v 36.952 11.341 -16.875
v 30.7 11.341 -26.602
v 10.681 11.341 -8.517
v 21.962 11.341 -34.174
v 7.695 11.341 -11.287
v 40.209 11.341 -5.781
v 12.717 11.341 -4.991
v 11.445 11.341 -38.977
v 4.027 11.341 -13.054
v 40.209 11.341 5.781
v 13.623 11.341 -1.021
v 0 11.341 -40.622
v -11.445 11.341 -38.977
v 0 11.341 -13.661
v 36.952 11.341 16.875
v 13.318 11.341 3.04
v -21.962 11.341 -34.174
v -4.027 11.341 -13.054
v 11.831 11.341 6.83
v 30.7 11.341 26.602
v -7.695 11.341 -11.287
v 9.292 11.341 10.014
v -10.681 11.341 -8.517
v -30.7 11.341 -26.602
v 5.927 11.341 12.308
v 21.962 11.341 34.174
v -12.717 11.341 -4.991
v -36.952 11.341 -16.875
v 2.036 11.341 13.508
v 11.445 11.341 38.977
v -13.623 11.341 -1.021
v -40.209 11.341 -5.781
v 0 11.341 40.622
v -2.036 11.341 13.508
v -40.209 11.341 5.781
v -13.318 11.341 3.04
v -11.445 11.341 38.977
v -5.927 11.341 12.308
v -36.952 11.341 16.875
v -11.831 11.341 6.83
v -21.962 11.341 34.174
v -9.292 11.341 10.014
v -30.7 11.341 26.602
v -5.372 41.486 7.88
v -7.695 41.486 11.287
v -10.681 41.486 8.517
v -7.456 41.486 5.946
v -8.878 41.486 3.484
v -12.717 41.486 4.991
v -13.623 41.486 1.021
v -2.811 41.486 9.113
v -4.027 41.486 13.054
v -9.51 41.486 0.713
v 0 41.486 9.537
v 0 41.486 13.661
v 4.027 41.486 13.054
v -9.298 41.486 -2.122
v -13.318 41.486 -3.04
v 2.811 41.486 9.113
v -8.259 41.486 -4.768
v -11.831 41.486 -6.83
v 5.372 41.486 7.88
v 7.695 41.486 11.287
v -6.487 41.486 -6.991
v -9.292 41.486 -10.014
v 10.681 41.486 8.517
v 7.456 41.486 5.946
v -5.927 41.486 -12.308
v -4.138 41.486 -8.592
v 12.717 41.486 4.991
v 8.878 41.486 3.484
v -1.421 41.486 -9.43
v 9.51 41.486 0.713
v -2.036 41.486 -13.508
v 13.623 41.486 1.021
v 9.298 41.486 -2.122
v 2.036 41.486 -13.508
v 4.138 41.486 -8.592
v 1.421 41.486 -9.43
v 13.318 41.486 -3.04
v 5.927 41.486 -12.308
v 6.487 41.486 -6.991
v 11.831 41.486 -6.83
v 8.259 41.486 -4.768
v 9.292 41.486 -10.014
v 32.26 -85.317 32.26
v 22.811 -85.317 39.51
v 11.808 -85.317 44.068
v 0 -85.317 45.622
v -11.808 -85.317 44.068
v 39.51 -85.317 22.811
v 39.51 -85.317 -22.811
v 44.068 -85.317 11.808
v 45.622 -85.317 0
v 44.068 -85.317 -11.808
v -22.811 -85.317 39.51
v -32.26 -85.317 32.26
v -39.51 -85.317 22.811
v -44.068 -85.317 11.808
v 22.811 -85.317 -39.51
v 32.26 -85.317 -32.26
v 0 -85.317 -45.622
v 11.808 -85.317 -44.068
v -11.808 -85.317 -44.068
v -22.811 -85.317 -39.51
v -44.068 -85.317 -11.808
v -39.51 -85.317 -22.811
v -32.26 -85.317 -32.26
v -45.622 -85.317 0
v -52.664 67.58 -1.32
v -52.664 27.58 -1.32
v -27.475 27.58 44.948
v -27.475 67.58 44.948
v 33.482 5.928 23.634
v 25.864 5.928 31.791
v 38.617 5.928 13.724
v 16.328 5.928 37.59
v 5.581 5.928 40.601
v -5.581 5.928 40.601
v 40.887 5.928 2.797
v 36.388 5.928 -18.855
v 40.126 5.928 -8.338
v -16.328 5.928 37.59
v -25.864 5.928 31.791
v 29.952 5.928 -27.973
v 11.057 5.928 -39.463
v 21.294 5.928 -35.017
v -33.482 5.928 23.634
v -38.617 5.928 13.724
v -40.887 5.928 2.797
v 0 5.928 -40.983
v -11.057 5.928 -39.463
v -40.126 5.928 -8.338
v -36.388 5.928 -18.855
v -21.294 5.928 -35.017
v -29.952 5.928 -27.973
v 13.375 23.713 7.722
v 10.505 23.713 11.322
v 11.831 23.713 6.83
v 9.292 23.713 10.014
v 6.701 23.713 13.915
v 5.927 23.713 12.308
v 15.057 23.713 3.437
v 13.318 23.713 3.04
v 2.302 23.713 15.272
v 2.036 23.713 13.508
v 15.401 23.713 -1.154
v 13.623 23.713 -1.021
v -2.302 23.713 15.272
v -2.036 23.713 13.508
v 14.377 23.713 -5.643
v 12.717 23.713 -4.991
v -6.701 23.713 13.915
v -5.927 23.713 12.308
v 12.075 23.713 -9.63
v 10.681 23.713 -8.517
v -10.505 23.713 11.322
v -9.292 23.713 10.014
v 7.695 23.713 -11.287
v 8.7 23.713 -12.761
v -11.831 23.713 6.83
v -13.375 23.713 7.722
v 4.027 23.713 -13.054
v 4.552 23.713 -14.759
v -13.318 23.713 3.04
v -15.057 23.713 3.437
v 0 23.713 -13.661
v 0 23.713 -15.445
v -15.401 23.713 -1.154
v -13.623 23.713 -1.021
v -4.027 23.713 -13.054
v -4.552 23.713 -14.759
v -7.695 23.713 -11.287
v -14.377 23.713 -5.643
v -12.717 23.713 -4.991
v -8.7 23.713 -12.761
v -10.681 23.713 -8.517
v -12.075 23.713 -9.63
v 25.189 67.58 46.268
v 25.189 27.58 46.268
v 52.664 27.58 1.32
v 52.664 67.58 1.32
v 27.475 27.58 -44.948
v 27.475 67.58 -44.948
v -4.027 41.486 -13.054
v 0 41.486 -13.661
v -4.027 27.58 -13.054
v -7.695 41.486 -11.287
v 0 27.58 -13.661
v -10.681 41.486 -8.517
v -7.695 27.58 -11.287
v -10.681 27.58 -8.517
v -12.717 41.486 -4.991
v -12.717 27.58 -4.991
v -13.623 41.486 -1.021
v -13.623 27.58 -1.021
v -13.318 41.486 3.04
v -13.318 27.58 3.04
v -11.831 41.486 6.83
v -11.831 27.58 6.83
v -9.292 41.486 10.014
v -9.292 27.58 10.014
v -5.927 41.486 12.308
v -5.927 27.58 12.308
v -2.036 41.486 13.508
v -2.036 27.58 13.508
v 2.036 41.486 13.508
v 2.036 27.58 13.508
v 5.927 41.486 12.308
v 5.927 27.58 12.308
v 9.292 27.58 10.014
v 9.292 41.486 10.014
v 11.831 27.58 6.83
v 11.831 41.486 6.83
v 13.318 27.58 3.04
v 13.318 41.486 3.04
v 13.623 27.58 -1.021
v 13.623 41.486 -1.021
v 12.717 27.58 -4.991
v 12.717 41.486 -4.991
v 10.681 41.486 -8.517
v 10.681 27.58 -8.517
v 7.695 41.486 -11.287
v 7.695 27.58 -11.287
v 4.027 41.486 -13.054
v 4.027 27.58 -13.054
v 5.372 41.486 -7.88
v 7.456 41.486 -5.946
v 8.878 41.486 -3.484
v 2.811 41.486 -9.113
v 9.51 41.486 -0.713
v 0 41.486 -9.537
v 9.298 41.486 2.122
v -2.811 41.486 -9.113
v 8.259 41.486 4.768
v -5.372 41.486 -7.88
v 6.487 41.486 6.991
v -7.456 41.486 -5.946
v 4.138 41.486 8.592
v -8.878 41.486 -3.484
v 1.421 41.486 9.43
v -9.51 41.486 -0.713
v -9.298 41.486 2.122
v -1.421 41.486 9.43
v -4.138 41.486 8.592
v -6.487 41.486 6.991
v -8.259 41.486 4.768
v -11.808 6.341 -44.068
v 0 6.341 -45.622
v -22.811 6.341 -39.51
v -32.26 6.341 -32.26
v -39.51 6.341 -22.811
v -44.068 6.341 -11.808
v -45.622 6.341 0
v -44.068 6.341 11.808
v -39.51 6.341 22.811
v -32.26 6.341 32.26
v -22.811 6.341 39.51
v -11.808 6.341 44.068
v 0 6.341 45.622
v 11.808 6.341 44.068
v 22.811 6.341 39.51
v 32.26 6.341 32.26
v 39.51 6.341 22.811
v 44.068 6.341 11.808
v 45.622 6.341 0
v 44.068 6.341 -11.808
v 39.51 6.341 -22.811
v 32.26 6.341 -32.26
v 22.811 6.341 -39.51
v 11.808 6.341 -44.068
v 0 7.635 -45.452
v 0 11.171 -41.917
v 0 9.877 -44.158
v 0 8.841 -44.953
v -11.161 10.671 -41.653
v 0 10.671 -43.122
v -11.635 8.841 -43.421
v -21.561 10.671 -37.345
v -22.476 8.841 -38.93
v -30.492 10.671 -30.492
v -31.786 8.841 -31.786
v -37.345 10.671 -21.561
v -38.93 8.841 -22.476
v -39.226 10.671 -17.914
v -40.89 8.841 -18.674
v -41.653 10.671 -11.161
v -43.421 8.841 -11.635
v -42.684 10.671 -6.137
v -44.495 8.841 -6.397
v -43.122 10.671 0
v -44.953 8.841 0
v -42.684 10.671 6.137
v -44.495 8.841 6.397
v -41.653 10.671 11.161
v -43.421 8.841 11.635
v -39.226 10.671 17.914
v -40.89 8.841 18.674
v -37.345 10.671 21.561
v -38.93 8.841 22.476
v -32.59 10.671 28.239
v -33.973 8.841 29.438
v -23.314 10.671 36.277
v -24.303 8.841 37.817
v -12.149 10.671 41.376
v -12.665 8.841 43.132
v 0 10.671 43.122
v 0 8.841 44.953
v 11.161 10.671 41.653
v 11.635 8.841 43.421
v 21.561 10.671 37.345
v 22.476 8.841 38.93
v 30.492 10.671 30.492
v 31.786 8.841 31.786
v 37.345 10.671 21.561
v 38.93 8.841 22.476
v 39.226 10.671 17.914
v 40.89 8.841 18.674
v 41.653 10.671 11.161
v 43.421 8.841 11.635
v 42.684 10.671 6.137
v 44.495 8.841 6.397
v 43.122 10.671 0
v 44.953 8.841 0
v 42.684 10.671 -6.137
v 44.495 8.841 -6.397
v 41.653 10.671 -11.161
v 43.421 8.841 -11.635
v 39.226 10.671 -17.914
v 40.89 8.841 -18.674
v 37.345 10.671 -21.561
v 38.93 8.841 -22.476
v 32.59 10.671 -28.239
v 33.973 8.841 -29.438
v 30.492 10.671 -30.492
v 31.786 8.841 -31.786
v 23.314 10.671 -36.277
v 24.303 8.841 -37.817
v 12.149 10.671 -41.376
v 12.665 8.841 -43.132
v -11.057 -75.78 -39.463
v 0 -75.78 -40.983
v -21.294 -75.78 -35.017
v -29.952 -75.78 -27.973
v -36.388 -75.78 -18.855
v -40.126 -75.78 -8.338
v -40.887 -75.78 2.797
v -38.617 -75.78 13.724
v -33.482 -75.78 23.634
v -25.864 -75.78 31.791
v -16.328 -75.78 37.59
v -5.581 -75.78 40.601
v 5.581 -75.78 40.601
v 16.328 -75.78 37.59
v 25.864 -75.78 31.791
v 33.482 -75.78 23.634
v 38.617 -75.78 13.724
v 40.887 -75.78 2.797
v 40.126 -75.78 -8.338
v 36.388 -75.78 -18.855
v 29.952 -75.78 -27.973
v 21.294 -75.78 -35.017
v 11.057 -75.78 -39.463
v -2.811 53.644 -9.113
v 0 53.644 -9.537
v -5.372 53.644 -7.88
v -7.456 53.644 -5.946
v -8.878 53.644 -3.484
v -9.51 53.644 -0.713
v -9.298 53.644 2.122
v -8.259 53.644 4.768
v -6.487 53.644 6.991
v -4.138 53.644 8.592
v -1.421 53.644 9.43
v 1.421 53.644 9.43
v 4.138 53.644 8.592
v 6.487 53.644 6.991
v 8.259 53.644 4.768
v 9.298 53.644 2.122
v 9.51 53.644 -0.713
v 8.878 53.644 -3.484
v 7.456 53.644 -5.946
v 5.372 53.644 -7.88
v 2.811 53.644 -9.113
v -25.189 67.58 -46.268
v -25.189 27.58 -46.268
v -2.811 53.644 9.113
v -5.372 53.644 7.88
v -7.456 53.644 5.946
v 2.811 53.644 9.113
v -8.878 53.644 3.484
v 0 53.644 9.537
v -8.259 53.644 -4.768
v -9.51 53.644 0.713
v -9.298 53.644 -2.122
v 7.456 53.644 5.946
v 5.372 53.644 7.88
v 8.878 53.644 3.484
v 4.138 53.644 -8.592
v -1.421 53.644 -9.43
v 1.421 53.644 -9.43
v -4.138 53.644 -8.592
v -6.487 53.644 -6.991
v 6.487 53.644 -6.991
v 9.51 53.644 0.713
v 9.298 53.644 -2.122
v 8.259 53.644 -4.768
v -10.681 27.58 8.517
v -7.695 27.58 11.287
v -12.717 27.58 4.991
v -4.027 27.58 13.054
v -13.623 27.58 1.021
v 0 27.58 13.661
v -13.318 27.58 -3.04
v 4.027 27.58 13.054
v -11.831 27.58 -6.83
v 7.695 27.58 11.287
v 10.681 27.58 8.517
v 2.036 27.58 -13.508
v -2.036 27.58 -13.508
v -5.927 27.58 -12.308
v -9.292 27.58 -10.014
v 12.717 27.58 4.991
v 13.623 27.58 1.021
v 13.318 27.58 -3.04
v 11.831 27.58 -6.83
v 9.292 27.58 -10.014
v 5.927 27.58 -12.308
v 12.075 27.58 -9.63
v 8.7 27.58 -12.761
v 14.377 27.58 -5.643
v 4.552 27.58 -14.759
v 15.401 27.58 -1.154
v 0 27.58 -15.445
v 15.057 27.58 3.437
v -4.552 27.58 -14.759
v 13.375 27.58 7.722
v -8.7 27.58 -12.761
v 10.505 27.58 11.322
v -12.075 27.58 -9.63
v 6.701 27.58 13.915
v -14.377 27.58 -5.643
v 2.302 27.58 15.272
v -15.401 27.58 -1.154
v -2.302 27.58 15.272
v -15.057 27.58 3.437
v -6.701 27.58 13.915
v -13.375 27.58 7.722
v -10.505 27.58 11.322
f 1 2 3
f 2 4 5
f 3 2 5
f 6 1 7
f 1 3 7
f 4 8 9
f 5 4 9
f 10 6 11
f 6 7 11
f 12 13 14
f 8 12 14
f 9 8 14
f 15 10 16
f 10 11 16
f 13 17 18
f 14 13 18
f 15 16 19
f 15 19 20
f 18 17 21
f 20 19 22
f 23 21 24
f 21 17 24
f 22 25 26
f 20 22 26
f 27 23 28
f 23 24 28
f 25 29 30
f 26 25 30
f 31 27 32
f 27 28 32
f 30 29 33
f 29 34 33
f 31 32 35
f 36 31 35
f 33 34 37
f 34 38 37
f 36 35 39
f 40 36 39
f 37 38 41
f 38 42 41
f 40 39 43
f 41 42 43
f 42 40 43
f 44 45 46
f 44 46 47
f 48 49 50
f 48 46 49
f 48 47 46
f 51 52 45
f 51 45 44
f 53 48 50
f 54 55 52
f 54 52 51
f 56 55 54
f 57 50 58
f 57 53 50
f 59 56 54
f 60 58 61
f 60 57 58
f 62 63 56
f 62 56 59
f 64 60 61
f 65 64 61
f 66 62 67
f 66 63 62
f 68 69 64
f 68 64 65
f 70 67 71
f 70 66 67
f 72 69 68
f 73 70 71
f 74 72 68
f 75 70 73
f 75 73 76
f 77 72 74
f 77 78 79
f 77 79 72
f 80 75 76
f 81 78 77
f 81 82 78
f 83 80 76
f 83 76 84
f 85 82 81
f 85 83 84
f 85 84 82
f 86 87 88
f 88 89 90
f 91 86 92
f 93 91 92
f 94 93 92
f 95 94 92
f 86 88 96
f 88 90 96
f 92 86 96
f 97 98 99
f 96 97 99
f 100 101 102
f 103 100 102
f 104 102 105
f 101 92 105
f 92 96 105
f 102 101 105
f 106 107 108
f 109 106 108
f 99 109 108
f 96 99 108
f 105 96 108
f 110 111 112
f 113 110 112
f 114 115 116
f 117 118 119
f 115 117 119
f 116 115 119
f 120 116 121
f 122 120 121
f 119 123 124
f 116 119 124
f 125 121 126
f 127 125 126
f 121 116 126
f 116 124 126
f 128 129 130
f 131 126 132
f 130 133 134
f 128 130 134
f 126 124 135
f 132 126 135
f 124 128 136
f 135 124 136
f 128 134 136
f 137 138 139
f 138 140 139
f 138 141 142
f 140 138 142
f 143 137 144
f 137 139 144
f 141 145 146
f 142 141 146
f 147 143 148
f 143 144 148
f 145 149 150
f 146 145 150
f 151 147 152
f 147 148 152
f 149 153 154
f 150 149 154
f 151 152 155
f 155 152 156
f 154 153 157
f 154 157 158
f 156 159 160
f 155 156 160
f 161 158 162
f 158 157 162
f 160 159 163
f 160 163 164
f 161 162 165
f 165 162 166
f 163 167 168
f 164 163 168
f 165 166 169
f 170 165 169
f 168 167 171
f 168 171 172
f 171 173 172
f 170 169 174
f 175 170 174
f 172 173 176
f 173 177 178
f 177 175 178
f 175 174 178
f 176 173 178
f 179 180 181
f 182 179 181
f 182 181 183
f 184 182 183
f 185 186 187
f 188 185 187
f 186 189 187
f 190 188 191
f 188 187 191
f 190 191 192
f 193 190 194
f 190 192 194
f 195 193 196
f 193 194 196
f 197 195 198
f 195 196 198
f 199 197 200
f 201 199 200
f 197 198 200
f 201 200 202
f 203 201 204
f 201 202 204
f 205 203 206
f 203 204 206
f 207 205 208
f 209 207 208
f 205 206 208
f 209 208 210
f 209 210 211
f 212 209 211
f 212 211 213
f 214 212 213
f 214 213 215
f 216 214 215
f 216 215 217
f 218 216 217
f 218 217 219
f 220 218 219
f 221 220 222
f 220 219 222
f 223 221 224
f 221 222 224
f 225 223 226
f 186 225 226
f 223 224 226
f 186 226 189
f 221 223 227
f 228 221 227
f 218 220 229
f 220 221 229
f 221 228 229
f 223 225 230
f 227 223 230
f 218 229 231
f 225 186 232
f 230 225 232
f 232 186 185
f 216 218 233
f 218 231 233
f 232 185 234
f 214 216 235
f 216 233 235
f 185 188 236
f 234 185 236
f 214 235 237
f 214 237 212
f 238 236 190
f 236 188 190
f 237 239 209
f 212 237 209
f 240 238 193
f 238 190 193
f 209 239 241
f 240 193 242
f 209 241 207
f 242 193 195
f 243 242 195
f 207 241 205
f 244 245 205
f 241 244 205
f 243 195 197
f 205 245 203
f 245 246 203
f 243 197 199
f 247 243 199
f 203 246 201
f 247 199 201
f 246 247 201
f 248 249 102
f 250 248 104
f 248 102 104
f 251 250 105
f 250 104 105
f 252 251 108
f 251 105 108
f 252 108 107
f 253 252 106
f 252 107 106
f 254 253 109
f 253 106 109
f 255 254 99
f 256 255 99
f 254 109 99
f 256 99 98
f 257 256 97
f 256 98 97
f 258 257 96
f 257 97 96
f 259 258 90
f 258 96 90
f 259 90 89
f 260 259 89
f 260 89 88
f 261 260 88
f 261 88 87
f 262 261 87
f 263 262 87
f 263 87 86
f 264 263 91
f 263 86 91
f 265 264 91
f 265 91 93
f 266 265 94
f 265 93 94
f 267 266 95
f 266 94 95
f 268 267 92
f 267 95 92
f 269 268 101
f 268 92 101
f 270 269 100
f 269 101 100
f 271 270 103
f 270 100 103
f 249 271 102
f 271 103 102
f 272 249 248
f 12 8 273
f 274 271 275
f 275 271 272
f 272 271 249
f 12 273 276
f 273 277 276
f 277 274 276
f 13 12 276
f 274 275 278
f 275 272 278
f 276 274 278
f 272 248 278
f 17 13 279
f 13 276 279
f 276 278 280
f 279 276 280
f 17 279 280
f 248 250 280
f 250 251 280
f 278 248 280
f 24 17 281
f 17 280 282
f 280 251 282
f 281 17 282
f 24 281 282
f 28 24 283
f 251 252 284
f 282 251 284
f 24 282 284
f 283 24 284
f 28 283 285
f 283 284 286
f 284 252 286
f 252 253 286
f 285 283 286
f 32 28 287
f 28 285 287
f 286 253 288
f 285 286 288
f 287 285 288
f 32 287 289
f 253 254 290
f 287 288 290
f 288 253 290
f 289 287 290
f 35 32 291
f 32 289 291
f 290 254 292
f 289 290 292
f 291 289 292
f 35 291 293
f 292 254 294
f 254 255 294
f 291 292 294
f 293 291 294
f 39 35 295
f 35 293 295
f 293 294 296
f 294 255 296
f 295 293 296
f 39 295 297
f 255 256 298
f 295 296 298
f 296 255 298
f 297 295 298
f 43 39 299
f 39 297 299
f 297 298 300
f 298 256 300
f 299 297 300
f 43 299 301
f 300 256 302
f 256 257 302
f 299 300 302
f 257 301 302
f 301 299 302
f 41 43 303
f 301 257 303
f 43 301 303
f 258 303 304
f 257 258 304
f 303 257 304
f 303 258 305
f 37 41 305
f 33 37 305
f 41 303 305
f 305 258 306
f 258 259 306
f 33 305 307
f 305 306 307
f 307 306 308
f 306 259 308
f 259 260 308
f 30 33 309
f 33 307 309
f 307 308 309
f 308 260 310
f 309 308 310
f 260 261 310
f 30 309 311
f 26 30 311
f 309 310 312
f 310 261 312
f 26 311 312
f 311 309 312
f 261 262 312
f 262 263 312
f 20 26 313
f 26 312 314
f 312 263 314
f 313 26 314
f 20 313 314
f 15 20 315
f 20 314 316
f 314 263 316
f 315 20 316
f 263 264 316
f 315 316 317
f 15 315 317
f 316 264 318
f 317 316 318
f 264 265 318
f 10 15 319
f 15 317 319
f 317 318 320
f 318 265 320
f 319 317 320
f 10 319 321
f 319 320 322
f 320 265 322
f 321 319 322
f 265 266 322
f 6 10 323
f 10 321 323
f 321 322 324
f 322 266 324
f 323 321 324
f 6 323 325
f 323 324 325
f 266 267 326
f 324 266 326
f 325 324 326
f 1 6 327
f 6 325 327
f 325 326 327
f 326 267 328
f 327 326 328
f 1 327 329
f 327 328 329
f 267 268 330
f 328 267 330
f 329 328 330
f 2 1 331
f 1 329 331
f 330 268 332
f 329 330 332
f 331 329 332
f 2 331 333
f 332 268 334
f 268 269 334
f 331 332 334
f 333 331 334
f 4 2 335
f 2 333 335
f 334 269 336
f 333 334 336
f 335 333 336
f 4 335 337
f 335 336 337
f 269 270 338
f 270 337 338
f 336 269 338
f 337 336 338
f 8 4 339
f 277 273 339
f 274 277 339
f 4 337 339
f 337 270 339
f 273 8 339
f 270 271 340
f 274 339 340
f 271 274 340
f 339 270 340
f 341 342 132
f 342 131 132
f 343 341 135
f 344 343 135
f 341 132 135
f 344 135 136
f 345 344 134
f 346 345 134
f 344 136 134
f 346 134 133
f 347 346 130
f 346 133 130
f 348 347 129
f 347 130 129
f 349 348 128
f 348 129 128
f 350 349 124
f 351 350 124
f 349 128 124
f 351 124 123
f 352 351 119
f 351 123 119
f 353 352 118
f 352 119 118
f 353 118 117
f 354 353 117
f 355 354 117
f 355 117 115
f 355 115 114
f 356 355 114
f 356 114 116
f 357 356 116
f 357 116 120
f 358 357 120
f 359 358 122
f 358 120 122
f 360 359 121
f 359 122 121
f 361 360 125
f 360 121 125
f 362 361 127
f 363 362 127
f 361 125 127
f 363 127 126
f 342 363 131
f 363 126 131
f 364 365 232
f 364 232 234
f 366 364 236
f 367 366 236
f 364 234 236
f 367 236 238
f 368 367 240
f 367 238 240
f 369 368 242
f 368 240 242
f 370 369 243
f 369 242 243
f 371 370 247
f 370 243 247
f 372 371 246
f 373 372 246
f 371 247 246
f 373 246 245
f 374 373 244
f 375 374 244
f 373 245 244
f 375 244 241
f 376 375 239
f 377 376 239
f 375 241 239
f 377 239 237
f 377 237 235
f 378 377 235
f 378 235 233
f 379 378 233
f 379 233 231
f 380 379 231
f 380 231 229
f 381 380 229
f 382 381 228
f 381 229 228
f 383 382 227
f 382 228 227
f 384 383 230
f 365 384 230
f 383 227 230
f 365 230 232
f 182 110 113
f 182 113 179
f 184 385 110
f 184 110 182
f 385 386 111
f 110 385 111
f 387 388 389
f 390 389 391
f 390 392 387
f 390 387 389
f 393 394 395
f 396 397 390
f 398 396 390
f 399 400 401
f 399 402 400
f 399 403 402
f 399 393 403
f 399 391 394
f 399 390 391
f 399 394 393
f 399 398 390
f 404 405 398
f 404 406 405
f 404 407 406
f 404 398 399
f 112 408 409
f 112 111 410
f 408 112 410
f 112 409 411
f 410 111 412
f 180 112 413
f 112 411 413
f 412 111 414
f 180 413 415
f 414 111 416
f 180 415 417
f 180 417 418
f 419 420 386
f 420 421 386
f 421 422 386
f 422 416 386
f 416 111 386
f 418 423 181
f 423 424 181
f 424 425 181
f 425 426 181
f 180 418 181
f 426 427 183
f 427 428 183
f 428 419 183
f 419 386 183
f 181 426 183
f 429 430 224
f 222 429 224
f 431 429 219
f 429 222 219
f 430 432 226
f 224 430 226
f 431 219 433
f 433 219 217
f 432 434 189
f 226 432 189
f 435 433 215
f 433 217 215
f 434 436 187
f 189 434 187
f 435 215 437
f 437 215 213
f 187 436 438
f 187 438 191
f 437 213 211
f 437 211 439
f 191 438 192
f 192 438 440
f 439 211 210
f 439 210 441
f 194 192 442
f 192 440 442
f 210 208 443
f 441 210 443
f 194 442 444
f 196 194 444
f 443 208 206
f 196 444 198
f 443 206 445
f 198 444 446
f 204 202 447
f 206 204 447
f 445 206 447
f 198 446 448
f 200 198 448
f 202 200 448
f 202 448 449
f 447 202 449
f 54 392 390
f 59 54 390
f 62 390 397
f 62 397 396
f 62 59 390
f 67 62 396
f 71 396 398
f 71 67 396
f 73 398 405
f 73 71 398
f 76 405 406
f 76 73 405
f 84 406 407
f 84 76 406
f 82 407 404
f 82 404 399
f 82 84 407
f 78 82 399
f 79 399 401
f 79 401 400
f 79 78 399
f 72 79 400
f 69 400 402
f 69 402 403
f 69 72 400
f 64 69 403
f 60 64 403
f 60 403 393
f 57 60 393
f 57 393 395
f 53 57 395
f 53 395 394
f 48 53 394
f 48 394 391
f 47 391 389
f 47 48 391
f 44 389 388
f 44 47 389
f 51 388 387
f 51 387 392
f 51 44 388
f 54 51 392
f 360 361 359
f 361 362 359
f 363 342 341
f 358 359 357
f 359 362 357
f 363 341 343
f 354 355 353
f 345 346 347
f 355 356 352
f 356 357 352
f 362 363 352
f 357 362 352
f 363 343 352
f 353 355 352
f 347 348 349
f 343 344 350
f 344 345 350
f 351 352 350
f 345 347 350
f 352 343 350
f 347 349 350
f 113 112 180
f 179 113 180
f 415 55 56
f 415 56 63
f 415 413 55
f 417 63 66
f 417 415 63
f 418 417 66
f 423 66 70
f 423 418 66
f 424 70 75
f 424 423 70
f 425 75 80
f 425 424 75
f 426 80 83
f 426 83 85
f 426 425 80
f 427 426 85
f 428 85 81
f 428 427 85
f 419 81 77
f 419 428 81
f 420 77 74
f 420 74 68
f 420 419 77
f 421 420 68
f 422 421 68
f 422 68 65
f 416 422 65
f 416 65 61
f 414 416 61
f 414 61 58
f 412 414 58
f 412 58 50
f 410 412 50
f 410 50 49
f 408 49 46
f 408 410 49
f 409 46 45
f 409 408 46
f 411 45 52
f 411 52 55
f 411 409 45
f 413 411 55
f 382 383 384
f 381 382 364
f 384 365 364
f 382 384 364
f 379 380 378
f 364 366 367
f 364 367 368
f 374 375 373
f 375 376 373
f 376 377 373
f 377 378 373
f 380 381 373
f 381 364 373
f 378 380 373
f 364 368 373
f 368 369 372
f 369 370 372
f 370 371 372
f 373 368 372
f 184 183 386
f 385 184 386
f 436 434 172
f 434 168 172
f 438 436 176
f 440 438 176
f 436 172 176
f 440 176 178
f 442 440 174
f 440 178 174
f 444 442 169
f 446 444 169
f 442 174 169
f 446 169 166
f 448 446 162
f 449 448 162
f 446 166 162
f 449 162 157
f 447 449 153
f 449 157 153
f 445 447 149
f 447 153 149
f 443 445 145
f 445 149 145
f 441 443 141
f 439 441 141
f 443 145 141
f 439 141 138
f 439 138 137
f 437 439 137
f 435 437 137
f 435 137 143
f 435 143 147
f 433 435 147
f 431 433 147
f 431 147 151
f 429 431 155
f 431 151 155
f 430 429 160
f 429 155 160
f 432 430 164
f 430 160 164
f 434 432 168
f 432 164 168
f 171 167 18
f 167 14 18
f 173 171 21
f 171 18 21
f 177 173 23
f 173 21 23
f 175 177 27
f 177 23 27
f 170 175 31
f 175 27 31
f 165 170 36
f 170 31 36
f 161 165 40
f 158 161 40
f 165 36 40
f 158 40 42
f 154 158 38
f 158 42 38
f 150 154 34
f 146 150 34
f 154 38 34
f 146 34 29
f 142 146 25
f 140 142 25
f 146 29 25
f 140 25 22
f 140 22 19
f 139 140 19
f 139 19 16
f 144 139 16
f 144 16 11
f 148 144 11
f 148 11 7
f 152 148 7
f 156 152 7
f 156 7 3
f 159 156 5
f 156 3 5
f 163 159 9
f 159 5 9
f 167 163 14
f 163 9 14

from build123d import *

# Parameters (mm, degrees)
FILLET1_R           = 5
BOSS_EXTRUDE1_DEPTH = 40


with BuildPart() as part:
    # Sketch1 → Revolve1 (revolve)
    with BuildSketch(Plane.XY):
        Polygon((0, 53.644352642), (9.536904547, 53.644352642), (9.536904547, 41.486045656), (13.660971378, 41.486045656), (13.660971378, 27.579696934), (15.444675892, 27.579696934), (15.444675892, 23.71338428), (13.660971378, 23.71338428), (13.660971378, 11.341183786), (45.622489321, 11.341183786), (45.622489321, -85.316632571), (0, -85.316632571), (0, -75.779728024), (40.982914135, -75.779728024), (40.982914135, 5.92834607), (0, 5.92834607), align=None)
    revolve(axis=Axis((0, 5.92834607, 0), (0, 1, 0)))

    # Fillet1
    fillet1_edges = [part.edges().sort_by_distance(p)[0] for p in [
        (-45.622489321, 11.341183786, 0),
    ]]
    fillet(fillet1_edges, radius=FILLET1_R)


with BuildPart() as body_2:
    # Sketch2 → Boss-Extrude1 (new body)
    with BuildSketch(Plane(origin=(0, 27.579696934, 0), x_dir=(1, 0, 0), z_dir=(0, 1, 0))):
        Polygon((52.66378308, -1.319593653), (27.474693167, 44.94837718), (-25.189089914, 46.267970834), (-52.66378308, 1.319593653), (-27.474693167, -44.94837718), (25.189089914, -46.267970834), align=None)
    extrude(amount=BOSS_EXTRUDE1_DEPTH)

    # Sketch1<2> → Cut-Revolve1 (revolve, cut)
    with BuildSketch(Plane.XY):
        Polygon((0, 53.644352642), (9.536904547, 53.644352642), (9.536904547, 41.486045656), (13.660971378, 41.486045656), (13.660971378, 27.579696934), (15.444675892, 27.579696934), (15.444675892, 23.71338428), (13.660971378, 23.71338428), (13.660971378, 11.341183786), (45.622489321, 11.341183786), (45.622489321, -85.316632571), (0, -85.316632571), (0, -75.779728024), (40.982914135, -75.779728024), (40.982914135, 5.92834607), (0, 5.92834607), align=None)
    revolve(axis=Axis((0, 5.92834607, 0), (0, 1, 0)), mode=Mode.SUBTRACT)


solid = Compound([part.part, body_2.part])
